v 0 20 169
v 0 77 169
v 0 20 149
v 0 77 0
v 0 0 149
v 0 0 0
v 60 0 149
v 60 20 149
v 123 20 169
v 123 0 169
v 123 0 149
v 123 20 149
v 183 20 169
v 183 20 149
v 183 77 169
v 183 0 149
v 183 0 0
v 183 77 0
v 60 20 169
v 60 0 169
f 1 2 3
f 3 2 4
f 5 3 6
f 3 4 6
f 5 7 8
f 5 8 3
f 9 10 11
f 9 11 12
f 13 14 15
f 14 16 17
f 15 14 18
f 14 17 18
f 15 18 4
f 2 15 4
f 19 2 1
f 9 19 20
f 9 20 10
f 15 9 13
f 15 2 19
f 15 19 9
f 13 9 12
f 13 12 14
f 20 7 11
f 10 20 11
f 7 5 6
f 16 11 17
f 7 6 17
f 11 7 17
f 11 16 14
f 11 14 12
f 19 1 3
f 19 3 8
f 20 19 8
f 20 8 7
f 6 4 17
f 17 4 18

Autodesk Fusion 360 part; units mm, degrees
sketch "Sketch1" plane through (0, 0, 0) normal (0, 0, 1) x (1, 0, 0)
  line L0 (0, 0) -> (183, 0)
  line L1 (183, 0) -> (183, 77)
  line L2 (183, 77) -> (0, 77)
  line L3 (0, 77) -> (0, 0)
  dimension "d1" = 183
  dimension "d2" = 77
extrude "Extrude1" add sketch "Sketch1" along normal blind 169
sketch "Sketch2" plane through (0, 0, 169) normal (0, 0, 1) x (-1, 0, 0)
  line L0 (0, -77) -> (0, 0)
  line L1 (0, 0) -> (-183, 0)
  line L2 (-183, 0) -> (-183, -77)
  line L3 (-183, -77) -> (0, -77)
  line L4 (0, -20) -> (-60, -20)
  line L5 (-60, -20) -> (-60, 0)
  line L6 (-60, 0) -> (0, 0)
  line L7 (0, 0) -> (0, -20)
  line L8 (-183, 0) -> (-123, 0)
  line L9 (-123, 0) -> (-123, -20)
  line L10 (-123, -20) -> (-183, -20)
  line L11 (-183, -20) -> (-183, 0)
  dimension "d5" = 60
extrude "Extrude2" cut sketch "Sketch2" against normal blind 20 contours L0 L1 L4 L5 L6 L7 | L1 L2 L8 L9 L10 L11
